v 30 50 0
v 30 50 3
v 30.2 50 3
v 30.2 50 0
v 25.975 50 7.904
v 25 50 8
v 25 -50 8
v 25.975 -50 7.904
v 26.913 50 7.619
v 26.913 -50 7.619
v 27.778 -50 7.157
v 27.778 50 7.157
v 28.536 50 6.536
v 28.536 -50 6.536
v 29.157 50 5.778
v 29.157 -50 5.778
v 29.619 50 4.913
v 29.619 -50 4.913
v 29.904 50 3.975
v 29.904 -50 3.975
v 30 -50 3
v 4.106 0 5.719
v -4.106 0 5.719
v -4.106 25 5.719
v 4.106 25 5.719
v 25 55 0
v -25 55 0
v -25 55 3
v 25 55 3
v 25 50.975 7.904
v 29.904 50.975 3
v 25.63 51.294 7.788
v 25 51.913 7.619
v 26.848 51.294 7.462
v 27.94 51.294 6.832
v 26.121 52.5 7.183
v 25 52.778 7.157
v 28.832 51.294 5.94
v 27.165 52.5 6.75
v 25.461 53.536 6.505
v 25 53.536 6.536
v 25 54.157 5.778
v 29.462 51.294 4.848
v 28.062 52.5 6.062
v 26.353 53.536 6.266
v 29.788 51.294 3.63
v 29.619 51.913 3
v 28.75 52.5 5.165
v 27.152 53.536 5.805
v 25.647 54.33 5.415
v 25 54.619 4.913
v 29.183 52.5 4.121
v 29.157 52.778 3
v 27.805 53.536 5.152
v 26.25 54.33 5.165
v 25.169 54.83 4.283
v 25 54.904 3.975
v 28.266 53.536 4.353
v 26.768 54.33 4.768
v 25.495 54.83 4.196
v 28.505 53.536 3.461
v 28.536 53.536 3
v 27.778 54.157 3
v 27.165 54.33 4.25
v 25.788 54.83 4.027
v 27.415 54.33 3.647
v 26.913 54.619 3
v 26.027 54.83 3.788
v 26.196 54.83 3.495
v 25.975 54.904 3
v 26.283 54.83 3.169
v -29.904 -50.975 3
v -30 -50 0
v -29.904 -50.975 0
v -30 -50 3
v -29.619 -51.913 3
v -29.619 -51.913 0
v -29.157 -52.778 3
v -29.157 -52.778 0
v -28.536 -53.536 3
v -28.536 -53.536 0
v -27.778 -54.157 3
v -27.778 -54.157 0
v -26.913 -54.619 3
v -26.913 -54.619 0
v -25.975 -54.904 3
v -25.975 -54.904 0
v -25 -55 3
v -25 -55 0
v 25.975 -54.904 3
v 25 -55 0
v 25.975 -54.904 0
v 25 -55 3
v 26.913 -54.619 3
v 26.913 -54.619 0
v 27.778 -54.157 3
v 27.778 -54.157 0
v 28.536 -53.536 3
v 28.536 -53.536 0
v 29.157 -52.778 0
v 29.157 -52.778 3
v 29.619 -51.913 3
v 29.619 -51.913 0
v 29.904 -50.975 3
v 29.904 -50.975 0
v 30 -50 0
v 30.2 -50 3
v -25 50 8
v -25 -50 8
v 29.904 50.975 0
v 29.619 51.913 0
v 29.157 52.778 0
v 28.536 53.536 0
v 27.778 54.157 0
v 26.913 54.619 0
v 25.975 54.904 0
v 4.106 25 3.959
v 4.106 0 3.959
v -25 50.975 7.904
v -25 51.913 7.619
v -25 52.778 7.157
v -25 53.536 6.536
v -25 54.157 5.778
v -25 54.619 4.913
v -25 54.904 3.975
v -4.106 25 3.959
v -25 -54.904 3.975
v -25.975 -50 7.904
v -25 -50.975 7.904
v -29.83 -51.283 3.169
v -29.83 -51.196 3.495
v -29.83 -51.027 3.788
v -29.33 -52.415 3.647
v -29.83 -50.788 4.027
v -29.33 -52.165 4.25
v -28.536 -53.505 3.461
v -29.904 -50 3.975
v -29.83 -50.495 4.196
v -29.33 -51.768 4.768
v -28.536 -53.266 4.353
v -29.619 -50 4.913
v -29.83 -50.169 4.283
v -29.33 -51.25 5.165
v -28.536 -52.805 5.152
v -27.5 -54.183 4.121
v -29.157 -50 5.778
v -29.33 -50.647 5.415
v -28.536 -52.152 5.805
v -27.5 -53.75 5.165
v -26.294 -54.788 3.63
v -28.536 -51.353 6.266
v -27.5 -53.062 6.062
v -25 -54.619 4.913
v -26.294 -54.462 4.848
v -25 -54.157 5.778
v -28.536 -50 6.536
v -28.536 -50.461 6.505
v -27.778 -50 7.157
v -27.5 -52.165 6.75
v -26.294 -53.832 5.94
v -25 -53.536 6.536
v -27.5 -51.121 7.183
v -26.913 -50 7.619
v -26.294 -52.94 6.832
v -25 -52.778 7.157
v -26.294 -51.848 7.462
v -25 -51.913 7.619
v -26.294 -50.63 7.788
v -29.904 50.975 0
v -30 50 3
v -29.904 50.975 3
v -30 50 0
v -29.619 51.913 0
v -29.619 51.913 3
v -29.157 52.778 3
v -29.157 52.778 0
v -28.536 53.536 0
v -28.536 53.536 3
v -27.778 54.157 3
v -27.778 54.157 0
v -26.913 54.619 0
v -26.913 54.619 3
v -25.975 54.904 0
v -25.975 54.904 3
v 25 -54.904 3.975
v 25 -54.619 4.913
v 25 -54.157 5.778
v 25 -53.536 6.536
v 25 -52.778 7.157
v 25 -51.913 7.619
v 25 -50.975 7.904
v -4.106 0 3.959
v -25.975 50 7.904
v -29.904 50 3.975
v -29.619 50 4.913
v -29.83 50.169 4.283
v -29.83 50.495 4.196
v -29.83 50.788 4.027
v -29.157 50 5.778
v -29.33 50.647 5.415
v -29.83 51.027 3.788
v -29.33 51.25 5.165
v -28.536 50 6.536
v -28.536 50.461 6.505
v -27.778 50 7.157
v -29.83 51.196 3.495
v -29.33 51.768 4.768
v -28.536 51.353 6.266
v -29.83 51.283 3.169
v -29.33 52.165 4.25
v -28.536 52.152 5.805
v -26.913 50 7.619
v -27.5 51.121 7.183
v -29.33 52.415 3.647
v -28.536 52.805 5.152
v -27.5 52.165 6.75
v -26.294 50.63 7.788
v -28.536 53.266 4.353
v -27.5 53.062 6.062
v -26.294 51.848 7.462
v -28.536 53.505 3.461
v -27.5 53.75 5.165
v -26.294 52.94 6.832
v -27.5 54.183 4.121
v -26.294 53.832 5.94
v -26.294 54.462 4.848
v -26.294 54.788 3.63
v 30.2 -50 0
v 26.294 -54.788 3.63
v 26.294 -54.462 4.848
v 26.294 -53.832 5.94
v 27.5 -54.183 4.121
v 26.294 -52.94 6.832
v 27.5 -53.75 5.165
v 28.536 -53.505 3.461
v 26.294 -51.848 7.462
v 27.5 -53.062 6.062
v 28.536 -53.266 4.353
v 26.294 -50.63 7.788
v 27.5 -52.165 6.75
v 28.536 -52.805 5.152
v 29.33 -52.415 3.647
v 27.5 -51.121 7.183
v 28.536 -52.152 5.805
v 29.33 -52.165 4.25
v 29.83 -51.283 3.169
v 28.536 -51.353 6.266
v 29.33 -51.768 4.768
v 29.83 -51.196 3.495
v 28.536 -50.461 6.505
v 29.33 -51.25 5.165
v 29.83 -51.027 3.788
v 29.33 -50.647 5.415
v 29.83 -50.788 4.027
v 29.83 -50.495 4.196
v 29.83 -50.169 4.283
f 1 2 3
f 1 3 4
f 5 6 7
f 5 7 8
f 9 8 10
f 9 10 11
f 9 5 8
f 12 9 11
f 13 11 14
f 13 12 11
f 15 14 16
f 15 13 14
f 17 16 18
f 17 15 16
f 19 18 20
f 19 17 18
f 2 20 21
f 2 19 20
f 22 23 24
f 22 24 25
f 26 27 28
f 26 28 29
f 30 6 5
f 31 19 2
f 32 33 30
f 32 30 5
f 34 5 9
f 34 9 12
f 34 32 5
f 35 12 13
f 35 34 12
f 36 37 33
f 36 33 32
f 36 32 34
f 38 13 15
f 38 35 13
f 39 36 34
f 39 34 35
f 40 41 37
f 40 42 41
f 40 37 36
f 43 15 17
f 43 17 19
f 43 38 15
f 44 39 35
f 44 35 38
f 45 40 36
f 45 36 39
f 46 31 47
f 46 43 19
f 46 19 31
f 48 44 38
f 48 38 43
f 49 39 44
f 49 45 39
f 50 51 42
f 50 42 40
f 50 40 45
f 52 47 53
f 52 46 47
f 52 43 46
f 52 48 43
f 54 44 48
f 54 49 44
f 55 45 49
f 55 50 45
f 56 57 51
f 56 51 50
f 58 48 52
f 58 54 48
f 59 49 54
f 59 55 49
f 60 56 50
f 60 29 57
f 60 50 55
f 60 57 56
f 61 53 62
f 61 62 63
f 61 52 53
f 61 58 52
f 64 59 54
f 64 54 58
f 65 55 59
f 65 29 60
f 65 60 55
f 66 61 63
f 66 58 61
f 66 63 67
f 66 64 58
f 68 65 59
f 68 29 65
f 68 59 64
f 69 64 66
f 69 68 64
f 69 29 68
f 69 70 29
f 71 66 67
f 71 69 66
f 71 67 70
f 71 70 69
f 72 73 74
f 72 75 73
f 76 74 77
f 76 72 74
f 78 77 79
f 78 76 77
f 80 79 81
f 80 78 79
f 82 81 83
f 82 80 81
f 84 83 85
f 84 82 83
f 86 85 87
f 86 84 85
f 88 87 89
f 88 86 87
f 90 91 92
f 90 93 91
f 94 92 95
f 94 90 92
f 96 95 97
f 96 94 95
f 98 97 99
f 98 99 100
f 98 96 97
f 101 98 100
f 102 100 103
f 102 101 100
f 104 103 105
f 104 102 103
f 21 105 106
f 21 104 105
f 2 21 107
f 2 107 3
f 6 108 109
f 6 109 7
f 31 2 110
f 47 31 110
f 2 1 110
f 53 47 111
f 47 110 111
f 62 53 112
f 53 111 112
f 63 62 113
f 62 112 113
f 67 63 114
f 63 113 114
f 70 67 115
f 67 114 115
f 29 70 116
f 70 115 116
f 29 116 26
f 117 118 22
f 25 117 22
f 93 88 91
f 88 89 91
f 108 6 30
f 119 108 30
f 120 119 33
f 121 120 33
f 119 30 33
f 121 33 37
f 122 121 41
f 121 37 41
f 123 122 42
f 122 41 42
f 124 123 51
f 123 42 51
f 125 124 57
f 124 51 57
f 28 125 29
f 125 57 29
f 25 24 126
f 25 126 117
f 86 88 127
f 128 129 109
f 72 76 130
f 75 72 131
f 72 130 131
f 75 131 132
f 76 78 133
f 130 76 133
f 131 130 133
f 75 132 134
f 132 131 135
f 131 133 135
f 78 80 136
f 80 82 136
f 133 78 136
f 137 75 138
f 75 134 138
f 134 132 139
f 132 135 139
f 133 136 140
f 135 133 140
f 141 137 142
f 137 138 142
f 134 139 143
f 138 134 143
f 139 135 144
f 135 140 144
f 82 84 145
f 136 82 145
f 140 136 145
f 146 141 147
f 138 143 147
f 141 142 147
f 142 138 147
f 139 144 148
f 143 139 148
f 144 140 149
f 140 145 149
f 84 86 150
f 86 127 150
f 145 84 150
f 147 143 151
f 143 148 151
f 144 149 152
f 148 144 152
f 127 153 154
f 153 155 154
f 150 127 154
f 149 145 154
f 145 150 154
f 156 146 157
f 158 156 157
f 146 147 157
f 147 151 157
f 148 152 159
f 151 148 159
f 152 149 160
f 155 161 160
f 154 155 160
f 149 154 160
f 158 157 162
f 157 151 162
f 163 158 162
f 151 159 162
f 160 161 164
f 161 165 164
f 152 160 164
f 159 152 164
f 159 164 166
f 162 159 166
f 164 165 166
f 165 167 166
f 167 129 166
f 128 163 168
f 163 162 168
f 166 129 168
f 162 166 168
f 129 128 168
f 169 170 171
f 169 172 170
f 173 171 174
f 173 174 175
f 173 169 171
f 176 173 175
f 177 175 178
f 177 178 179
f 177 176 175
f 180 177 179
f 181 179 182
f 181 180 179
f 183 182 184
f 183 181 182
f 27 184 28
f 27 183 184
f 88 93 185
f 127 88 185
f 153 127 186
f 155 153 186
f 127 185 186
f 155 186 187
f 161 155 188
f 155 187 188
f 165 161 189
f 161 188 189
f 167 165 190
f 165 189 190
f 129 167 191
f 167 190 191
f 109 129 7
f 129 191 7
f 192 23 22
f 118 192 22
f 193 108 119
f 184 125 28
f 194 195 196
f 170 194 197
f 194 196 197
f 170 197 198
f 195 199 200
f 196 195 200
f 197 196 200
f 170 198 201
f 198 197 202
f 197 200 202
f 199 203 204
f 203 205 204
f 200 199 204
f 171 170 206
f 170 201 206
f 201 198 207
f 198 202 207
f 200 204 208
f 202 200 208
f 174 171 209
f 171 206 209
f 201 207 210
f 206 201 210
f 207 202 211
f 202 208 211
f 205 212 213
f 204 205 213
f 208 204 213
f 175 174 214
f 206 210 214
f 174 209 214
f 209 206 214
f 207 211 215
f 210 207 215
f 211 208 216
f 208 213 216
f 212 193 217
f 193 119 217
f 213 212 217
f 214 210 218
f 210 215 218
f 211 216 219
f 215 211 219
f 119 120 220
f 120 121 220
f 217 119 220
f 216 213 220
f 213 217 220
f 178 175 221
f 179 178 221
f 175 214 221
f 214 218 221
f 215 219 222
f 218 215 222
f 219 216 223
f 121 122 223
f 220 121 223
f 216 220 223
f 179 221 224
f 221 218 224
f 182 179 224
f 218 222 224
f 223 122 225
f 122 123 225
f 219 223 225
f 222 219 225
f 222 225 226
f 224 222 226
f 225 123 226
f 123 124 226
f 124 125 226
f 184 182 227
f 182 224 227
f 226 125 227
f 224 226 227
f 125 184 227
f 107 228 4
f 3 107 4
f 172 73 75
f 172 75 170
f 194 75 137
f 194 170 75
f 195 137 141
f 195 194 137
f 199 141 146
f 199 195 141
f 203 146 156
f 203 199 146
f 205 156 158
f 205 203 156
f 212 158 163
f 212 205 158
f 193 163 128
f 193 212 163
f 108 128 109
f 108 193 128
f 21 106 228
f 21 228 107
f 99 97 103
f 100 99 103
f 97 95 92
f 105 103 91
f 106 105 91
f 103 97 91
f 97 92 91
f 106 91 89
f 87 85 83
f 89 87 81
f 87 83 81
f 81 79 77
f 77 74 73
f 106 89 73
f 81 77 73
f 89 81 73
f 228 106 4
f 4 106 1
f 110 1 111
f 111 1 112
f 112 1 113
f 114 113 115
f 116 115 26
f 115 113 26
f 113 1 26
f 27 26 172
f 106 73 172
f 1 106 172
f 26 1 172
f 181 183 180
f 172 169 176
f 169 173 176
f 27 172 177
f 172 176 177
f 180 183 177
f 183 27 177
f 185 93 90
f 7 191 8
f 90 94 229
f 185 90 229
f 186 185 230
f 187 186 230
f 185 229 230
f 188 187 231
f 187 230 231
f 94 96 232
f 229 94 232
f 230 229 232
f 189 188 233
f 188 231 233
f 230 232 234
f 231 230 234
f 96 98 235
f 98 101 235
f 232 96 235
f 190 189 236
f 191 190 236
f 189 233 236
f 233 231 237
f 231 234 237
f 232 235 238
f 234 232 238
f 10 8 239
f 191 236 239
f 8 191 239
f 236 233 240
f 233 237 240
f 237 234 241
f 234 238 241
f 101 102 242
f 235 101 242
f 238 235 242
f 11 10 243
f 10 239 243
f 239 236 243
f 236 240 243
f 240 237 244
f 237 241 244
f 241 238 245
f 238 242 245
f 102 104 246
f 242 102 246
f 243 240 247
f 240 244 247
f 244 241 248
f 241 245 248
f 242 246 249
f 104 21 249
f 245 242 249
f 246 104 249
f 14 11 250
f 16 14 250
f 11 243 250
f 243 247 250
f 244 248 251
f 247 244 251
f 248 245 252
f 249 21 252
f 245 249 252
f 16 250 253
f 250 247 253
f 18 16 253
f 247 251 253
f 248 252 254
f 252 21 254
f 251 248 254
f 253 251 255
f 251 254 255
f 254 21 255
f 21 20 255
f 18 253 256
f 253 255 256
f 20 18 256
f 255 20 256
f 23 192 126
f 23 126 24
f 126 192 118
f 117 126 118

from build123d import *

# Parameters (mm, degrees)
F0_W     = 60
F0_H     = 110
F1_DEPTH = 8
F2_R     = 5
F3_R     = 5
F4_R     = 5
F5_DEPTH = 0.2
F6_R     = 5
F7_W     = 8.2122897729
F7_H     = 1.7597768456
F8_DEPTH = 0.8
F9_DEPTH = 25


with BuildPart() as f1:
    # F0 (on Top) → F1 (new body)
    with BuildSketch(Plane.XY):
        Rectangle(F0_W, F0_H)
    extrude(amount=F1_DEPTH)

    # F2
    f2_edges = [f1.edges().sort_by_distance(p)[0] for p in [
        (0, -55, 8),
    ]]
    fillet(f2_edges, radius=F2_R)

    # F3
    f3_edges = [f1.edges().sort_by_distance(p)[0] for p in [
        (30, 2.5, 8),
    ]]
    fillet(f3_edges, radius=F3_R)

    # F4
    f4_edges = [f1.edges().sort_by_distance(p)[0] for p in [
        (-2.5, 55, 8),
    ]]
    fillet(f4_edges, radius=F4_R)

    # F5 (add): a face of the model
    f5_faces = [f1.faces().sort_by_distance(p)[0] for p in [
        (30, 0, 1.5),
    ]]
    extrude(f5_faces, amount=F5_DEPTH)

    # F6
    f6_edges = [f1.edges().sort_by_distance(p)[0] for p in [
        (-30, 0, 8),
    ]]
    fillet(f6_edges, radius=F6_R)

    # F7 (on Front) → F8 (cut)
    with BuildSketch(Plane.XZ):
        with Locations((0, 4.8393858597)):
            Rectangle(F7_W, F7_H)
    extrude(amount=-F8_DEPTH, mode=Mode.SUBTRACT)

    # F7 (on Front) → F9 (cut)
    with BuildSketch(Plane.XZ):
        with Locations((0, 4.8393858597)):
            Rectangle(F7_W, F7_H)
    extrude(amount=-F9_DEPTH, mode=Mode.SUBTRACT)


solid = f1.part
